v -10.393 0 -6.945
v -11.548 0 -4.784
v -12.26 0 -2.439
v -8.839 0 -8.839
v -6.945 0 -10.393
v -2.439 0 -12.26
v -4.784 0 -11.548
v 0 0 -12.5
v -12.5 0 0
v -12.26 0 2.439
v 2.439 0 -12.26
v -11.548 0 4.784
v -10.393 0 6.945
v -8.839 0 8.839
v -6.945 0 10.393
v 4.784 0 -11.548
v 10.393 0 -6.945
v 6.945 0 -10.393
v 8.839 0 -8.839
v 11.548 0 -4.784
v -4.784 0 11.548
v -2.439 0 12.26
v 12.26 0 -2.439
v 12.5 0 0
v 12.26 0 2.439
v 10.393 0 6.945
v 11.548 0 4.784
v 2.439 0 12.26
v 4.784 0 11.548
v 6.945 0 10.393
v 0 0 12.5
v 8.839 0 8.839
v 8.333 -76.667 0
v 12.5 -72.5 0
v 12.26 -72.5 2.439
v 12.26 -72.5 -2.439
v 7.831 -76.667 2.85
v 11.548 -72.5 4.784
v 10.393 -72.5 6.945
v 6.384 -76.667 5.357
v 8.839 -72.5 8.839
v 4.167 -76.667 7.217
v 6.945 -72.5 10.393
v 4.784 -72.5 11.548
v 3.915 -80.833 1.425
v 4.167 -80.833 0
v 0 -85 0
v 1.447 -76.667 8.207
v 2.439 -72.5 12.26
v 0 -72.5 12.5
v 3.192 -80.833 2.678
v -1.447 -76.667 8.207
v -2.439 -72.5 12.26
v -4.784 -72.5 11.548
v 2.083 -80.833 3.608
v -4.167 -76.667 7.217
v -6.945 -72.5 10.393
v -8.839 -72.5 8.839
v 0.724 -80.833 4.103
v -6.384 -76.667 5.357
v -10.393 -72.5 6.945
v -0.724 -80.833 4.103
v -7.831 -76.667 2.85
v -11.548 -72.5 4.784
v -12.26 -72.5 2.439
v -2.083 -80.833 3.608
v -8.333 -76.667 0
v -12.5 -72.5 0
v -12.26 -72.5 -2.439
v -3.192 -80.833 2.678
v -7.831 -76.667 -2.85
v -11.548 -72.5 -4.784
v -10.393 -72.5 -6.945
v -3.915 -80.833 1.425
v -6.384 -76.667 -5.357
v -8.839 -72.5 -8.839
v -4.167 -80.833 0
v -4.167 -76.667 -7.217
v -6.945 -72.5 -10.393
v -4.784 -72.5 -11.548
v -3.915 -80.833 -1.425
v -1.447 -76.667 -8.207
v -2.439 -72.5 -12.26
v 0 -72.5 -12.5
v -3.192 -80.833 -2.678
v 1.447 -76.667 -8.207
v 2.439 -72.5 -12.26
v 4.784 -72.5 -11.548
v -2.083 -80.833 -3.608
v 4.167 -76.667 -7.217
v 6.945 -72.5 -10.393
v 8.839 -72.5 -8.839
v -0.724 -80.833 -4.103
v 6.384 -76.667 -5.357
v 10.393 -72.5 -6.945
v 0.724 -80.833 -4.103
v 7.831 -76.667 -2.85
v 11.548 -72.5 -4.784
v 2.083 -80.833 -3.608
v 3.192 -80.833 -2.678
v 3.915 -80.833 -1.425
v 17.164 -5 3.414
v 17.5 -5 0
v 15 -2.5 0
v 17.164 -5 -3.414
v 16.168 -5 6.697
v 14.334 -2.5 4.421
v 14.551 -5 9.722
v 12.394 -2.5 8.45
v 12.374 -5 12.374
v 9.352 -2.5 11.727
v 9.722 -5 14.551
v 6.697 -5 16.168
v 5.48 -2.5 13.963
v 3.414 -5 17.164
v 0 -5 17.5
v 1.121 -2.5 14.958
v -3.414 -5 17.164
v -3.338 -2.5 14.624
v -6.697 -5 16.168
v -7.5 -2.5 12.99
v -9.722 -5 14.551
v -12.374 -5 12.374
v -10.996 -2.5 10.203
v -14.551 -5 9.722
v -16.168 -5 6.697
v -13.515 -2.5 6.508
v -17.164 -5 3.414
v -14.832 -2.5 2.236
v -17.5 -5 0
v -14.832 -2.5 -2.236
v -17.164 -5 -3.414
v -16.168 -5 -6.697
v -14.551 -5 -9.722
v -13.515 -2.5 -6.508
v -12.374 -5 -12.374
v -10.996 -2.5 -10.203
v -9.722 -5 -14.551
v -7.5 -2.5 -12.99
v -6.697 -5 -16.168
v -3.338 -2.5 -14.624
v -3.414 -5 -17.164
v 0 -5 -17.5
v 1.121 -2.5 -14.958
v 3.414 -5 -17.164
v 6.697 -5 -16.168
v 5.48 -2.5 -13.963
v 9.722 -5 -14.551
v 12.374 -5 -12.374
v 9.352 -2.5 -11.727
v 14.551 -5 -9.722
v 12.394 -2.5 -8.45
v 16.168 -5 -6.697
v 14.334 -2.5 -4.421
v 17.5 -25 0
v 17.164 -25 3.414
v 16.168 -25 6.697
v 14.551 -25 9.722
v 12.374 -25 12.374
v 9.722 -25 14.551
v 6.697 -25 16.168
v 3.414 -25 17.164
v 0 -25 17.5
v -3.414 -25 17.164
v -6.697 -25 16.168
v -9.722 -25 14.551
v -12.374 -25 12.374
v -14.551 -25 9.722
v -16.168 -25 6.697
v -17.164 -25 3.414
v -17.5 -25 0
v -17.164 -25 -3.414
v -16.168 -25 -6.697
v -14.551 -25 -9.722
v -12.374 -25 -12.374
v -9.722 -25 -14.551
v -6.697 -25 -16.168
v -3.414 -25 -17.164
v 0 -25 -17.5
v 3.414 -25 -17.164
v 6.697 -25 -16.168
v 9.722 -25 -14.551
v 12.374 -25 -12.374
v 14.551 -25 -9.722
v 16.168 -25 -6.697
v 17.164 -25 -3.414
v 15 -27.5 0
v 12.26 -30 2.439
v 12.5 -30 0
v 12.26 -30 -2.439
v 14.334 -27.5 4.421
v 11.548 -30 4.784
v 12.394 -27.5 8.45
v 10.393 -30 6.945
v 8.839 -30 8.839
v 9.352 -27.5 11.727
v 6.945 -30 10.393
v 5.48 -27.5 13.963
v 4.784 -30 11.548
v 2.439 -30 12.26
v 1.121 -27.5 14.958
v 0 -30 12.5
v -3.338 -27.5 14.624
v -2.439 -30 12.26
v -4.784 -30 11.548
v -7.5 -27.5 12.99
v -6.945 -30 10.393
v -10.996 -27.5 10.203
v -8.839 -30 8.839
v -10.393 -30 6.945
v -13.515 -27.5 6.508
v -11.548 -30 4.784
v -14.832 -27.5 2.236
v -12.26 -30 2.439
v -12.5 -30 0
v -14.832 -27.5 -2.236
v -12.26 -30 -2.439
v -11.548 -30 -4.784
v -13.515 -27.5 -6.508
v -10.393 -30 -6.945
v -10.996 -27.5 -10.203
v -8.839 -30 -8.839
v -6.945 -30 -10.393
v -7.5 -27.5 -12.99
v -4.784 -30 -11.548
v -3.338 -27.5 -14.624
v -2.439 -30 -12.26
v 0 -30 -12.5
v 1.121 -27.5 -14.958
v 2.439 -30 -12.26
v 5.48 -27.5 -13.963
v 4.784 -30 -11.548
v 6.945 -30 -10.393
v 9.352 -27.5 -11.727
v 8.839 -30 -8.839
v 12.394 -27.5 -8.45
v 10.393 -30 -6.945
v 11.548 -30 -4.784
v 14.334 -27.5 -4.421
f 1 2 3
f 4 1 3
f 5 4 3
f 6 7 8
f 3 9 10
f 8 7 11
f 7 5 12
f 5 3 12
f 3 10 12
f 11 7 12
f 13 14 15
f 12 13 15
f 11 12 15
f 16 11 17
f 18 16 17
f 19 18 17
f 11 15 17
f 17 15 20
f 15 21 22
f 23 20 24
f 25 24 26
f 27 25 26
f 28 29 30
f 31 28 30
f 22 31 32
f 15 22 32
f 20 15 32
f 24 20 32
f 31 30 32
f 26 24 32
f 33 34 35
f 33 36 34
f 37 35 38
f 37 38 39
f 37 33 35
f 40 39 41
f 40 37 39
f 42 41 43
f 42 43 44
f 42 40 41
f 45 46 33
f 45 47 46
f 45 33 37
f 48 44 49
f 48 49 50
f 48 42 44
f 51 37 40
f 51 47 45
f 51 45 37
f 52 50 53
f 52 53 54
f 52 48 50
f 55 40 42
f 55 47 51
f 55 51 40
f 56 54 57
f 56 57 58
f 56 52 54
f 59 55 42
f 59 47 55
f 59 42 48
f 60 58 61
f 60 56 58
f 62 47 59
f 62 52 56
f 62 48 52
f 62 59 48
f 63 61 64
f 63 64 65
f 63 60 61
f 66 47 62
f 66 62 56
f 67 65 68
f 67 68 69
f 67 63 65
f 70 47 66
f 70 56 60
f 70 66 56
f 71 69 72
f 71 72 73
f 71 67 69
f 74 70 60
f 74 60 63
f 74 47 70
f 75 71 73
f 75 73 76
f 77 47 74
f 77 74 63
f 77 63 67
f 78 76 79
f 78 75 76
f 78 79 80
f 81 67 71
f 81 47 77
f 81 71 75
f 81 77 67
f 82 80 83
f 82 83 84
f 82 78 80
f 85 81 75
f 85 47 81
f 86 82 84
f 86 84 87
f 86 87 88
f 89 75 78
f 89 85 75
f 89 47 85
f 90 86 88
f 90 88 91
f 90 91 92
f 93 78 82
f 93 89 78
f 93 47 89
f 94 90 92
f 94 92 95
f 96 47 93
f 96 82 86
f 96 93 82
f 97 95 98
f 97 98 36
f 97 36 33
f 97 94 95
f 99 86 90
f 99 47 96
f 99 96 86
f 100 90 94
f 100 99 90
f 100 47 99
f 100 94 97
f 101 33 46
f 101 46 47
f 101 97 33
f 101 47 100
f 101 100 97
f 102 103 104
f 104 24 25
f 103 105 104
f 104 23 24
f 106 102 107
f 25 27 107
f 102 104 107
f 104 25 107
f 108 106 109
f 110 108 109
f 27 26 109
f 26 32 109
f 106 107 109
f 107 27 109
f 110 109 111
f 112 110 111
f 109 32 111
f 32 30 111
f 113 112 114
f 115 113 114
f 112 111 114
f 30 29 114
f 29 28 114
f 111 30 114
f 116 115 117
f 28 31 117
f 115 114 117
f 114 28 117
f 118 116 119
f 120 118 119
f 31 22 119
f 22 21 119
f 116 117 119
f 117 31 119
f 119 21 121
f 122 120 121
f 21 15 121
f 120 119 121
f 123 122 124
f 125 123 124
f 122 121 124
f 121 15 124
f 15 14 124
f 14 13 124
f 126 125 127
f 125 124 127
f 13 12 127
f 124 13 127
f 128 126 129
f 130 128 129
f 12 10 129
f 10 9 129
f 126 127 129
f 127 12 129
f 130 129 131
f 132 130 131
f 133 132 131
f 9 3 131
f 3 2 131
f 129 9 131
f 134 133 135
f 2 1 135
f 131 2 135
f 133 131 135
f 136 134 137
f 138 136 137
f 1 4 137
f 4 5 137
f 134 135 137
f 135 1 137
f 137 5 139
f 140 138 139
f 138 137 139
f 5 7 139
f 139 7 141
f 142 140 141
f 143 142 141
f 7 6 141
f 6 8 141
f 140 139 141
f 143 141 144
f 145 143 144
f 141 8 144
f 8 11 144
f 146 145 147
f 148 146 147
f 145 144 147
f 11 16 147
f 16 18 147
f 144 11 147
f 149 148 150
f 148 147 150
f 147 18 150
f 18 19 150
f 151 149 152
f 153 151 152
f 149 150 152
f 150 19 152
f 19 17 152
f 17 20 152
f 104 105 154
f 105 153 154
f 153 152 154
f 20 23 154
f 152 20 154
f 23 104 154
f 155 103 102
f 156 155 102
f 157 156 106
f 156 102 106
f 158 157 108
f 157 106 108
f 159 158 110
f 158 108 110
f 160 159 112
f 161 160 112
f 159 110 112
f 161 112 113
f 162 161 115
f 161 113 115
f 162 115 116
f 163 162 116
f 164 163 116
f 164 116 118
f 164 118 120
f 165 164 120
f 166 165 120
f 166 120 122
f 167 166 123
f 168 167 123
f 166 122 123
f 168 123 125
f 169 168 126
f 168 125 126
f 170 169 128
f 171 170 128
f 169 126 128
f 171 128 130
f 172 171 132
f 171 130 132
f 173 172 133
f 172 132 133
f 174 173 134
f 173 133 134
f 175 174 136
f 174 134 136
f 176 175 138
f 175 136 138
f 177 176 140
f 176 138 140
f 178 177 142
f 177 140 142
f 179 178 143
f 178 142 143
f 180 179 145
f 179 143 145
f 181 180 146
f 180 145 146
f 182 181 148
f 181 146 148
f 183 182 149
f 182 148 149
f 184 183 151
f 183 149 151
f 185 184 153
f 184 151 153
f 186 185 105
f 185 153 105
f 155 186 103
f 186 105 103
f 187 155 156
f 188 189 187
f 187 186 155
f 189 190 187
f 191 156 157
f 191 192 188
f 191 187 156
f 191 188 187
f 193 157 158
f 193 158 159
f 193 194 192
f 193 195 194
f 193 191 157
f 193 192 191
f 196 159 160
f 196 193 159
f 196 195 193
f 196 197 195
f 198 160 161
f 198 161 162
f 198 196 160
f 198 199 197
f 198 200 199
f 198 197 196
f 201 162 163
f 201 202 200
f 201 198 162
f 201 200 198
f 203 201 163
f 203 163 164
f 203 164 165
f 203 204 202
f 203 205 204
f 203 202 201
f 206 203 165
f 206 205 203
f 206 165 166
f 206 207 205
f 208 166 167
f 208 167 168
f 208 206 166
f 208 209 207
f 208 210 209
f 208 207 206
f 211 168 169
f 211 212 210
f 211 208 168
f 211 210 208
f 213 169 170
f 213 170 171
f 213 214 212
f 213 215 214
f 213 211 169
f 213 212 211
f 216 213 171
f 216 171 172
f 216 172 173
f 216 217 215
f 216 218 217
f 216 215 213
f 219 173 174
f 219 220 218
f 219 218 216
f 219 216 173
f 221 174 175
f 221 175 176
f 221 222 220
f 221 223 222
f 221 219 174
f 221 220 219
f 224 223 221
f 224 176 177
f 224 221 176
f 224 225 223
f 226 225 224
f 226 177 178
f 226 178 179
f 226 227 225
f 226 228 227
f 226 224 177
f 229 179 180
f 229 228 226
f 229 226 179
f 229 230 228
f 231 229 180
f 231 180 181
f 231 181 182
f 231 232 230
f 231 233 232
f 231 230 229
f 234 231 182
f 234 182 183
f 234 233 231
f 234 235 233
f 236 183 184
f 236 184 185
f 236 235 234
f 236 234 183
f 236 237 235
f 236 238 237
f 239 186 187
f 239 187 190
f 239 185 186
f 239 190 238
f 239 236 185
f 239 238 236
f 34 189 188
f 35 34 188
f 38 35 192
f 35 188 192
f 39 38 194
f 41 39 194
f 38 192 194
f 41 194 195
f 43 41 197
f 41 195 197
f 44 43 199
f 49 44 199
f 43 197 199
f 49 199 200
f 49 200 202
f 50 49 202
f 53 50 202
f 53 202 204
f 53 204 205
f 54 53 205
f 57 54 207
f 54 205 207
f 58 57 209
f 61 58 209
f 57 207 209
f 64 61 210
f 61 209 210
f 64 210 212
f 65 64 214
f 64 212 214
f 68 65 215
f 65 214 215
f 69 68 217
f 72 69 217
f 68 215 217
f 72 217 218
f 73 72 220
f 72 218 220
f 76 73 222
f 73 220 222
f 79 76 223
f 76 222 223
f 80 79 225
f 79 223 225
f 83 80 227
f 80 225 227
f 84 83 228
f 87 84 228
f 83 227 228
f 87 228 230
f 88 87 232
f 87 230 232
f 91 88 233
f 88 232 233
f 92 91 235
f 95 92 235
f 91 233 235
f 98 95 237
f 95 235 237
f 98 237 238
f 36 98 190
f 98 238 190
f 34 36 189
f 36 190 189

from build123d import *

# Parameters (mm, degrees)
F0_R      = 17.5
F1_DEPTH  = 30
F2_SIZE   = 5
F3_R      = 8.75
F1_FACE_R = 12.5
F4_DEPTH  = 55
F5_SIZE   = 12.5


with BuildPart() as f1:
    # F0 (on Front) → F1 (new body)
    with BuildSketch(Plane.XZ):
        Circle(F0_R)
    extrude(amount=F1_DEPTH)

    # F2
    f2_edges = [f1.edges().sort_by_distance(p)[0] for p in [
        (17.5, -15, 0),
        (-17.5, 0, 0),
        (-17.5, -30, 0),
    ]]
    chamfer(f2_edges, length=F2_SIZE)

    # F3 (on Front) + F1_face (on face) → F4 (join)
    with BuildSketch(Plane.XZ):
        Circle(F3_R)
    with BuildSketch(Plane.XZ.offset(30)):
        Circle(F1_FACE_R)
    extrude(amount=F4_DEPTH)

    # F5
    f5_edges = [f1.edges().sort_by_distance(p)[0] for p in [
        (-12.5, -85, 0),
    ]]
    chamfer(f5_edges, length=F5_SIZE)


solid = f1.part
